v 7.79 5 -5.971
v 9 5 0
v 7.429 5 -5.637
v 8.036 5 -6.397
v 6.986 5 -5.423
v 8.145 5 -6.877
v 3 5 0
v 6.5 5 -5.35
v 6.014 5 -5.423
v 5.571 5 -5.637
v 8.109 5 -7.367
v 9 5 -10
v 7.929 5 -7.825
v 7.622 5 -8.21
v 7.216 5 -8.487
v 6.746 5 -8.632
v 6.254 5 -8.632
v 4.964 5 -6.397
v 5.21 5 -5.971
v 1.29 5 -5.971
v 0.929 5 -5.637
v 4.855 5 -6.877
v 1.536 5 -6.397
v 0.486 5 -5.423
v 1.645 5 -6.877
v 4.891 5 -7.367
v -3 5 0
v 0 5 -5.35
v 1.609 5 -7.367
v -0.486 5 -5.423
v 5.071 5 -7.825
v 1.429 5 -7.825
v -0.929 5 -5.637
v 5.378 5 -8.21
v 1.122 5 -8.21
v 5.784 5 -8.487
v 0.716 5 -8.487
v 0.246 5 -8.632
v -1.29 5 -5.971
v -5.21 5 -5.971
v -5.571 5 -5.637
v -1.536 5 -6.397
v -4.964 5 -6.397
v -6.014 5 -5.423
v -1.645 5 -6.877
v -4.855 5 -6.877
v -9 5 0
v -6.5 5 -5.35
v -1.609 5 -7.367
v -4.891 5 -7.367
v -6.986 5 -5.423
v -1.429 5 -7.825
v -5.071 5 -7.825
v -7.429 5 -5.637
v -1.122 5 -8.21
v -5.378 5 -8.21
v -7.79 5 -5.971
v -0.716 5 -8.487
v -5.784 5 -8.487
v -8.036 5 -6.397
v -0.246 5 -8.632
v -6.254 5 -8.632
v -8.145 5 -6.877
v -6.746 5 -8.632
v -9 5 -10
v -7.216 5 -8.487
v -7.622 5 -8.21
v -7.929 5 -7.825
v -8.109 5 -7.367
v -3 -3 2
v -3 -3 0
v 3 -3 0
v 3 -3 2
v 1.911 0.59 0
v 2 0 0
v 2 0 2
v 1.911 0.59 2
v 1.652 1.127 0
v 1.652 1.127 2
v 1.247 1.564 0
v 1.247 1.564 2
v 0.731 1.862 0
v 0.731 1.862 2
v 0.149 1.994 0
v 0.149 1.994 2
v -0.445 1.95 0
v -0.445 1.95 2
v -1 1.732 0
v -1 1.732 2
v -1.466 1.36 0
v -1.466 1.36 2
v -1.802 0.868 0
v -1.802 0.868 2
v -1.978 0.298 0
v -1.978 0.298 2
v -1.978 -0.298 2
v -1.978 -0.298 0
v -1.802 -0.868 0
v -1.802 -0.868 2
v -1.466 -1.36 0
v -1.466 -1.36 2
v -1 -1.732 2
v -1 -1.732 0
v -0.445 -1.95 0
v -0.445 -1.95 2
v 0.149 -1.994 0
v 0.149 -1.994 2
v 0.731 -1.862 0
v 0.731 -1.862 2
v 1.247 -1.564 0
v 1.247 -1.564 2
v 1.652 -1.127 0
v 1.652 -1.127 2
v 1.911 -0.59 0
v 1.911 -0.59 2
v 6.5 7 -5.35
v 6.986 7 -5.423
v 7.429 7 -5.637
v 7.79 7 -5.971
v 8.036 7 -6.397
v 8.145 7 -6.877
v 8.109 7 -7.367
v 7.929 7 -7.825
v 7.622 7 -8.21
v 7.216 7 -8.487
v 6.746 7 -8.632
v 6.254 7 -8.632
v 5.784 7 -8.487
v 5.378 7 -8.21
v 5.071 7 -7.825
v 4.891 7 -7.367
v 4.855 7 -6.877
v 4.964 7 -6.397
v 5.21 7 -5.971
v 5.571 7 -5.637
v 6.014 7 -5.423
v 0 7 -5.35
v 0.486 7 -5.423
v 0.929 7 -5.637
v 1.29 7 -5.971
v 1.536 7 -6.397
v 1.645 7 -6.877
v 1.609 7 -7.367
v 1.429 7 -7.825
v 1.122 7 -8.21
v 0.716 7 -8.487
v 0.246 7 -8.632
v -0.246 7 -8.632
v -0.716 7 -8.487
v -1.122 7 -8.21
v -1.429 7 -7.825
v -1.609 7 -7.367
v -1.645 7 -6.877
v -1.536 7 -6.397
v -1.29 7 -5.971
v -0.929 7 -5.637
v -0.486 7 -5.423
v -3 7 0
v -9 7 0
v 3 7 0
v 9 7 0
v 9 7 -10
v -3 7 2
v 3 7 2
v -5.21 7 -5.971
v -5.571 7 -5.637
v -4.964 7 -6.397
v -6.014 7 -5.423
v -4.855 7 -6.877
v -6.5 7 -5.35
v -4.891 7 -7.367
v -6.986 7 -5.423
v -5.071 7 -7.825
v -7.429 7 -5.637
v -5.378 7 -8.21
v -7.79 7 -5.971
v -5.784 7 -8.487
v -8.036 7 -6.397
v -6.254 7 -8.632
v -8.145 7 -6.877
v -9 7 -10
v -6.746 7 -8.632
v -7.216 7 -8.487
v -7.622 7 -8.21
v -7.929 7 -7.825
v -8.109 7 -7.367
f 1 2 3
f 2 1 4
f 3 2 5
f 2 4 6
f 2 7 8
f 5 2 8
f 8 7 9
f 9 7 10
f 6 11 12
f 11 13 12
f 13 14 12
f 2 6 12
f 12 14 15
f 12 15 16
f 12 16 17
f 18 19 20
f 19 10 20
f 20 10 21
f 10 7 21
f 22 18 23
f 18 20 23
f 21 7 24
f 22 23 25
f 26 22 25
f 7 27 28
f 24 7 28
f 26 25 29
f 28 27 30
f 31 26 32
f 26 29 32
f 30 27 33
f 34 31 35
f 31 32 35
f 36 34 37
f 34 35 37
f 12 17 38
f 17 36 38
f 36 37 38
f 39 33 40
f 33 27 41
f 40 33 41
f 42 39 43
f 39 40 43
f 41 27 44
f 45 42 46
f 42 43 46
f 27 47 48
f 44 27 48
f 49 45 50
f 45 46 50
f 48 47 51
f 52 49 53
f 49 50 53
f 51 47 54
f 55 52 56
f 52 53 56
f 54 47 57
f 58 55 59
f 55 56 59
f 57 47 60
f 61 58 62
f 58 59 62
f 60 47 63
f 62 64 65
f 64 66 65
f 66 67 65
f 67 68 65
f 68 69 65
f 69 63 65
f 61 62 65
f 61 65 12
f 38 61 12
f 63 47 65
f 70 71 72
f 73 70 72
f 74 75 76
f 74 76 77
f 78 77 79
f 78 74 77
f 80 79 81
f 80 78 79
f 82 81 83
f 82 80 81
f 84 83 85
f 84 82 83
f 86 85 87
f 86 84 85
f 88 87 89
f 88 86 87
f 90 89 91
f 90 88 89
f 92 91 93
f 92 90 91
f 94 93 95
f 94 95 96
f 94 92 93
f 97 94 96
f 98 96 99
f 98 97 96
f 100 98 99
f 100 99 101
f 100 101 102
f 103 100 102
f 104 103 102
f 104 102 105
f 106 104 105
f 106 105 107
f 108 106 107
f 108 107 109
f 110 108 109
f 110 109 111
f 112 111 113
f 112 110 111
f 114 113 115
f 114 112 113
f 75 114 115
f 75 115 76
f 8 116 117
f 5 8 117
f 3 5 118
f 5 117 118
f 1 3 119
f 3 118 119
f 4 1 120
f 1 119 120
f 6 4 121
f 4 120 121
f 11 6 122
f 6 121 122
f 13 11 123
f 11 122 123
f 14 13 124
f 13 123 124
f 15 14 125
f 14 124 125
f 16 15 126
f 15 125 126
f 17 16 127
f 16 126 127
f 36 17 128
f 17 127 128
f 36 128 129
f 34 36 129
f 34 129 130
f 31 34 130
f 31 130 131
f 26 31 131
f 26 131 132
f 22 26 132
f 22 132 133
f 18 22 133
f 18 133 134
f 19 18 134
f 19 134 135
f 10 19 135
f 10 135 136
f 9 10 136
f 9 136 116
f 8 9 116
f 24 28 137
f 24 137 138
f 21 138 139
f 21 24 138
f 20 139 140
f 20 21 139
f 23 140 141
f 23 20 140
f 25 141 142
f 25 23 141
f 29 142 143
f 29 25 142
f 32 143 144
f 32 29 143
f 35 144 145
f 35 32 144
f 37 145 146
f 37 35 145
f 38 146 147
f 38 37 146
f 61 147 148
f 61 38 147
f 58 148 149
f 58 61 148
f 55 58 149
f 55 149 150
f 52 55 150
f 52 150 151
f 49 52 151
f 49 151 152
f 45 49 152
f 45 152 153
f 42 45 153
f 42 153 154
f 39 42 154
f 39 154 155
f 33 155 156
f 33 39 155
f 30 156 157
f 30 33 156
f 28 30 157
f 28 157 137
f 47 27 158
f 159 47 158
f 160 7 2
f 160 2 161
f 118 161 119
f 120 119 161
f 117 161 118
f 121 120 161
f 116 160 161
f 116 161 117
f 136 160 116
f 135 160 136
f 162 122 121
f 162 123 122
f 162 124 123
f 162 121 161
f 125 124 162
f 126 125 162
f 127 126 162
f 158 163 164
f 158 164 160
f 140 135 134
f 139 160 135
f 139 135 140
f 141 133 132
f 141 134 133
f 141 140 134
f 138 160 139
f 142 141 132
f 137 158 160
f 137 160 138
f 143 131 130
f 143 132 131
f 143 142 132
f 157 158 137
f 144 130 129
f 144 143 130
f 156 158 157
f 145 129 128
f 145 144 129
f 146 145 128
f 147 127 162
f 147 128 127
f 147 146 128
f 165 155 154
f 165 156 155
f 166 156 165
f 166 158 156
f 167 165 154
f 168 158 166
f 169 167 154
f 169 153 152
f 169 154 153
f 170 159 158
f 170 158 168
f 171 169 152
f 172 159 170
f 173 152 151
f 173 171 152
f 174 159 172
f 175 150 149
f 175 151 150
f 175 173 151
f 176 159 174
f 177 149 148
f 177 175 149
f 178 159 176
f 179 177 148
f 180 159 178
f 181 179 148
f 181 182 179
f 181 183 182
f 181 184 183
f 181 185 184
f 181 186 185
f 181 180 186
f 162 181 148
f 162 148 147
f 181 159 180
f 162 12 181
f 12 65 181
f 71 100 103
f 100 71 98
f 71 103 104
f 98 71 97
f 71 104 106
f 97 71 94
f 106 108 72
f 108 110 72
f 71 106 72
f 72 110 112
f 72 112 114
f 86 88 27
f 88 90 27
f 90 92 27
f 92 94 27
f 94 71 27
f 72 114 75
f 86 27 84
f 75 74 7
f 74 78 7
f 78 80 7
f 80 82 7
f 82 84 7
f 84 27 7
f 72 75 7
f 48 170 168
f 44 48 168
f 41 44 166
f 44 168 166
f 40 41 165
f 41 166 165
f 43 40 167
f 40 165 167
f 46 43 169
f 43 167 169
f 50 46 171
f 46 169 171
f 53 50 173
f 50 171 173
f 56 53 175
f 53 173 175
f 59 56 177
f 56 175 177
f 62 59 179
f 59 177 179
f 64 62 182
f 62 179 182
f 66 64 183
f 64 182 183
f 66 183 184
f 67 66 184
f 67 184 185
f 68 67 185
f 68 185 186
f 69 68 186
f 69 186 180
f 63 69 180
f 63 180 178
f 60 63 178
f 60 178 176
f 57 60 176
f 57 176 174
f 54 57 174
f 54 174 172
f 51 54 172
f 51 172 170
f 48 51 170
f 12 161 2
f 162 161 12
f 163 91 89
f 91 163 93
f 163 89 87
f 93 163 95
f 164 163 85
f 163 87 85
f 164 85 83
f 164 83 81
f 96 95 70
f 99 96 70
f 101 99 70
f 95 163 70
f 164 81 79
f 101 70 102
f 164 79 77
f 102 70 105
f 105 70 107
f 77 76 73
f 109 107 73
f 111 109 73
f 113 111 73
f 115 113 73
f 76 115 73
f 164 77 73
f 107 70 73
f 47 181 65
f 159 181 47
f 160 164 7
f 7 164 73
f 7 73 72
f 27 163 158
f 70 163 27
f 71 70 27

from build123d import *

# Parameters (mm, degrees)
SKETCH_1_W          = 6
SKETCH_1_H          = 8
SKETCH_1_R          = 2
EXTRUDE_1_DEPTH     = 2
SKETCH_2_W          = 6
SKETCH_2_H          = 12
SKETCH_2_R          = 1.65
EXTRUDE_2_DEPTH     = 2
SKETCH_3_W          = 10
SKETCH_3_H          = 2
EXTRUDE_3_DEPTH     = 6
SKETCH_4_W          = 10
SKETCH_4_H          = 2
EXTRUDE_4_DEPTH     = 6
SKETCH_6_R          = 1.65
CUT_EXTRUDE_1_DEPTH = 6


with BuildPart() as part:
    # 草图1 → 凸台-拉伸1 (new body)
    with BuildSketch(Plane.XY):
        with Locations((0, 1)):
            Rectangle(SKETCH_1_W, SKETCH_1_H)
        Circle(SKETCH_1_R, mode=Mode.SUBTRACT)
    extrude(amount=EXTRUDE_1_DEPTH)

    # 草图2 → 凸台-拉伸2 (add)
    with BuildSketch(Plane(origin=(0, 5, 0), x_dir=(1, 0, 0), z_dir=(0, 1, 0))):
        with Locations((0, 4)):
            Rectangle(SKETCH_2_W, SKETCH_2_H)
        with Locations(Location((0, 7, 0), (0, 0, 270))):
            Circle(SKETCH_2_R, mode=Mode.SUBTRACT)
    extrude(amount=EXTRUDE_2_DEPTH)

    # 草图3 → 凸台-拉伸3 (add)
    with BuildSketch(Plane.ZY.offset(3)):
        with Locations((-5, 6)):
            Rectangle(SKETCH_3_W, SKETCH_3_H)
    extrude(amount=EXTRUDE_3_DEPTH)

    # 草图4 → 凸台-拉伸4 (add)
    with BuildSketch(Plane(origin=(3, 0, 0), x_dir=(0, 0, -1), z_dir=(1, 0, 0))):
        with Locations((5, 6)):
            Rectangle(SKETCH_4_W, SKETCH_4_H)
    extrude(amount=EXTRUDE_4_DEPTH)

    # 草图6 → 切除-拉伸1 (cut)
    with BuildSketch(Plane(origin=(0, 7, 0), x_dir=(1, 0, 0), z_dir=(0, 1, 0))):
        with Locations(Location((-6.5, 7, 0), (0, 0, 270))):
            Circle(SKETCH_6_R)
        with Locations(Location((6.5, 7, 0), (0, 0, 270))):
            Circle(SKETCH_6_R)
    extrude(amount=-CUT_EXTRUDE_1_DEPTH, mode=Mode.SUBTRACT)


solid = part.part
